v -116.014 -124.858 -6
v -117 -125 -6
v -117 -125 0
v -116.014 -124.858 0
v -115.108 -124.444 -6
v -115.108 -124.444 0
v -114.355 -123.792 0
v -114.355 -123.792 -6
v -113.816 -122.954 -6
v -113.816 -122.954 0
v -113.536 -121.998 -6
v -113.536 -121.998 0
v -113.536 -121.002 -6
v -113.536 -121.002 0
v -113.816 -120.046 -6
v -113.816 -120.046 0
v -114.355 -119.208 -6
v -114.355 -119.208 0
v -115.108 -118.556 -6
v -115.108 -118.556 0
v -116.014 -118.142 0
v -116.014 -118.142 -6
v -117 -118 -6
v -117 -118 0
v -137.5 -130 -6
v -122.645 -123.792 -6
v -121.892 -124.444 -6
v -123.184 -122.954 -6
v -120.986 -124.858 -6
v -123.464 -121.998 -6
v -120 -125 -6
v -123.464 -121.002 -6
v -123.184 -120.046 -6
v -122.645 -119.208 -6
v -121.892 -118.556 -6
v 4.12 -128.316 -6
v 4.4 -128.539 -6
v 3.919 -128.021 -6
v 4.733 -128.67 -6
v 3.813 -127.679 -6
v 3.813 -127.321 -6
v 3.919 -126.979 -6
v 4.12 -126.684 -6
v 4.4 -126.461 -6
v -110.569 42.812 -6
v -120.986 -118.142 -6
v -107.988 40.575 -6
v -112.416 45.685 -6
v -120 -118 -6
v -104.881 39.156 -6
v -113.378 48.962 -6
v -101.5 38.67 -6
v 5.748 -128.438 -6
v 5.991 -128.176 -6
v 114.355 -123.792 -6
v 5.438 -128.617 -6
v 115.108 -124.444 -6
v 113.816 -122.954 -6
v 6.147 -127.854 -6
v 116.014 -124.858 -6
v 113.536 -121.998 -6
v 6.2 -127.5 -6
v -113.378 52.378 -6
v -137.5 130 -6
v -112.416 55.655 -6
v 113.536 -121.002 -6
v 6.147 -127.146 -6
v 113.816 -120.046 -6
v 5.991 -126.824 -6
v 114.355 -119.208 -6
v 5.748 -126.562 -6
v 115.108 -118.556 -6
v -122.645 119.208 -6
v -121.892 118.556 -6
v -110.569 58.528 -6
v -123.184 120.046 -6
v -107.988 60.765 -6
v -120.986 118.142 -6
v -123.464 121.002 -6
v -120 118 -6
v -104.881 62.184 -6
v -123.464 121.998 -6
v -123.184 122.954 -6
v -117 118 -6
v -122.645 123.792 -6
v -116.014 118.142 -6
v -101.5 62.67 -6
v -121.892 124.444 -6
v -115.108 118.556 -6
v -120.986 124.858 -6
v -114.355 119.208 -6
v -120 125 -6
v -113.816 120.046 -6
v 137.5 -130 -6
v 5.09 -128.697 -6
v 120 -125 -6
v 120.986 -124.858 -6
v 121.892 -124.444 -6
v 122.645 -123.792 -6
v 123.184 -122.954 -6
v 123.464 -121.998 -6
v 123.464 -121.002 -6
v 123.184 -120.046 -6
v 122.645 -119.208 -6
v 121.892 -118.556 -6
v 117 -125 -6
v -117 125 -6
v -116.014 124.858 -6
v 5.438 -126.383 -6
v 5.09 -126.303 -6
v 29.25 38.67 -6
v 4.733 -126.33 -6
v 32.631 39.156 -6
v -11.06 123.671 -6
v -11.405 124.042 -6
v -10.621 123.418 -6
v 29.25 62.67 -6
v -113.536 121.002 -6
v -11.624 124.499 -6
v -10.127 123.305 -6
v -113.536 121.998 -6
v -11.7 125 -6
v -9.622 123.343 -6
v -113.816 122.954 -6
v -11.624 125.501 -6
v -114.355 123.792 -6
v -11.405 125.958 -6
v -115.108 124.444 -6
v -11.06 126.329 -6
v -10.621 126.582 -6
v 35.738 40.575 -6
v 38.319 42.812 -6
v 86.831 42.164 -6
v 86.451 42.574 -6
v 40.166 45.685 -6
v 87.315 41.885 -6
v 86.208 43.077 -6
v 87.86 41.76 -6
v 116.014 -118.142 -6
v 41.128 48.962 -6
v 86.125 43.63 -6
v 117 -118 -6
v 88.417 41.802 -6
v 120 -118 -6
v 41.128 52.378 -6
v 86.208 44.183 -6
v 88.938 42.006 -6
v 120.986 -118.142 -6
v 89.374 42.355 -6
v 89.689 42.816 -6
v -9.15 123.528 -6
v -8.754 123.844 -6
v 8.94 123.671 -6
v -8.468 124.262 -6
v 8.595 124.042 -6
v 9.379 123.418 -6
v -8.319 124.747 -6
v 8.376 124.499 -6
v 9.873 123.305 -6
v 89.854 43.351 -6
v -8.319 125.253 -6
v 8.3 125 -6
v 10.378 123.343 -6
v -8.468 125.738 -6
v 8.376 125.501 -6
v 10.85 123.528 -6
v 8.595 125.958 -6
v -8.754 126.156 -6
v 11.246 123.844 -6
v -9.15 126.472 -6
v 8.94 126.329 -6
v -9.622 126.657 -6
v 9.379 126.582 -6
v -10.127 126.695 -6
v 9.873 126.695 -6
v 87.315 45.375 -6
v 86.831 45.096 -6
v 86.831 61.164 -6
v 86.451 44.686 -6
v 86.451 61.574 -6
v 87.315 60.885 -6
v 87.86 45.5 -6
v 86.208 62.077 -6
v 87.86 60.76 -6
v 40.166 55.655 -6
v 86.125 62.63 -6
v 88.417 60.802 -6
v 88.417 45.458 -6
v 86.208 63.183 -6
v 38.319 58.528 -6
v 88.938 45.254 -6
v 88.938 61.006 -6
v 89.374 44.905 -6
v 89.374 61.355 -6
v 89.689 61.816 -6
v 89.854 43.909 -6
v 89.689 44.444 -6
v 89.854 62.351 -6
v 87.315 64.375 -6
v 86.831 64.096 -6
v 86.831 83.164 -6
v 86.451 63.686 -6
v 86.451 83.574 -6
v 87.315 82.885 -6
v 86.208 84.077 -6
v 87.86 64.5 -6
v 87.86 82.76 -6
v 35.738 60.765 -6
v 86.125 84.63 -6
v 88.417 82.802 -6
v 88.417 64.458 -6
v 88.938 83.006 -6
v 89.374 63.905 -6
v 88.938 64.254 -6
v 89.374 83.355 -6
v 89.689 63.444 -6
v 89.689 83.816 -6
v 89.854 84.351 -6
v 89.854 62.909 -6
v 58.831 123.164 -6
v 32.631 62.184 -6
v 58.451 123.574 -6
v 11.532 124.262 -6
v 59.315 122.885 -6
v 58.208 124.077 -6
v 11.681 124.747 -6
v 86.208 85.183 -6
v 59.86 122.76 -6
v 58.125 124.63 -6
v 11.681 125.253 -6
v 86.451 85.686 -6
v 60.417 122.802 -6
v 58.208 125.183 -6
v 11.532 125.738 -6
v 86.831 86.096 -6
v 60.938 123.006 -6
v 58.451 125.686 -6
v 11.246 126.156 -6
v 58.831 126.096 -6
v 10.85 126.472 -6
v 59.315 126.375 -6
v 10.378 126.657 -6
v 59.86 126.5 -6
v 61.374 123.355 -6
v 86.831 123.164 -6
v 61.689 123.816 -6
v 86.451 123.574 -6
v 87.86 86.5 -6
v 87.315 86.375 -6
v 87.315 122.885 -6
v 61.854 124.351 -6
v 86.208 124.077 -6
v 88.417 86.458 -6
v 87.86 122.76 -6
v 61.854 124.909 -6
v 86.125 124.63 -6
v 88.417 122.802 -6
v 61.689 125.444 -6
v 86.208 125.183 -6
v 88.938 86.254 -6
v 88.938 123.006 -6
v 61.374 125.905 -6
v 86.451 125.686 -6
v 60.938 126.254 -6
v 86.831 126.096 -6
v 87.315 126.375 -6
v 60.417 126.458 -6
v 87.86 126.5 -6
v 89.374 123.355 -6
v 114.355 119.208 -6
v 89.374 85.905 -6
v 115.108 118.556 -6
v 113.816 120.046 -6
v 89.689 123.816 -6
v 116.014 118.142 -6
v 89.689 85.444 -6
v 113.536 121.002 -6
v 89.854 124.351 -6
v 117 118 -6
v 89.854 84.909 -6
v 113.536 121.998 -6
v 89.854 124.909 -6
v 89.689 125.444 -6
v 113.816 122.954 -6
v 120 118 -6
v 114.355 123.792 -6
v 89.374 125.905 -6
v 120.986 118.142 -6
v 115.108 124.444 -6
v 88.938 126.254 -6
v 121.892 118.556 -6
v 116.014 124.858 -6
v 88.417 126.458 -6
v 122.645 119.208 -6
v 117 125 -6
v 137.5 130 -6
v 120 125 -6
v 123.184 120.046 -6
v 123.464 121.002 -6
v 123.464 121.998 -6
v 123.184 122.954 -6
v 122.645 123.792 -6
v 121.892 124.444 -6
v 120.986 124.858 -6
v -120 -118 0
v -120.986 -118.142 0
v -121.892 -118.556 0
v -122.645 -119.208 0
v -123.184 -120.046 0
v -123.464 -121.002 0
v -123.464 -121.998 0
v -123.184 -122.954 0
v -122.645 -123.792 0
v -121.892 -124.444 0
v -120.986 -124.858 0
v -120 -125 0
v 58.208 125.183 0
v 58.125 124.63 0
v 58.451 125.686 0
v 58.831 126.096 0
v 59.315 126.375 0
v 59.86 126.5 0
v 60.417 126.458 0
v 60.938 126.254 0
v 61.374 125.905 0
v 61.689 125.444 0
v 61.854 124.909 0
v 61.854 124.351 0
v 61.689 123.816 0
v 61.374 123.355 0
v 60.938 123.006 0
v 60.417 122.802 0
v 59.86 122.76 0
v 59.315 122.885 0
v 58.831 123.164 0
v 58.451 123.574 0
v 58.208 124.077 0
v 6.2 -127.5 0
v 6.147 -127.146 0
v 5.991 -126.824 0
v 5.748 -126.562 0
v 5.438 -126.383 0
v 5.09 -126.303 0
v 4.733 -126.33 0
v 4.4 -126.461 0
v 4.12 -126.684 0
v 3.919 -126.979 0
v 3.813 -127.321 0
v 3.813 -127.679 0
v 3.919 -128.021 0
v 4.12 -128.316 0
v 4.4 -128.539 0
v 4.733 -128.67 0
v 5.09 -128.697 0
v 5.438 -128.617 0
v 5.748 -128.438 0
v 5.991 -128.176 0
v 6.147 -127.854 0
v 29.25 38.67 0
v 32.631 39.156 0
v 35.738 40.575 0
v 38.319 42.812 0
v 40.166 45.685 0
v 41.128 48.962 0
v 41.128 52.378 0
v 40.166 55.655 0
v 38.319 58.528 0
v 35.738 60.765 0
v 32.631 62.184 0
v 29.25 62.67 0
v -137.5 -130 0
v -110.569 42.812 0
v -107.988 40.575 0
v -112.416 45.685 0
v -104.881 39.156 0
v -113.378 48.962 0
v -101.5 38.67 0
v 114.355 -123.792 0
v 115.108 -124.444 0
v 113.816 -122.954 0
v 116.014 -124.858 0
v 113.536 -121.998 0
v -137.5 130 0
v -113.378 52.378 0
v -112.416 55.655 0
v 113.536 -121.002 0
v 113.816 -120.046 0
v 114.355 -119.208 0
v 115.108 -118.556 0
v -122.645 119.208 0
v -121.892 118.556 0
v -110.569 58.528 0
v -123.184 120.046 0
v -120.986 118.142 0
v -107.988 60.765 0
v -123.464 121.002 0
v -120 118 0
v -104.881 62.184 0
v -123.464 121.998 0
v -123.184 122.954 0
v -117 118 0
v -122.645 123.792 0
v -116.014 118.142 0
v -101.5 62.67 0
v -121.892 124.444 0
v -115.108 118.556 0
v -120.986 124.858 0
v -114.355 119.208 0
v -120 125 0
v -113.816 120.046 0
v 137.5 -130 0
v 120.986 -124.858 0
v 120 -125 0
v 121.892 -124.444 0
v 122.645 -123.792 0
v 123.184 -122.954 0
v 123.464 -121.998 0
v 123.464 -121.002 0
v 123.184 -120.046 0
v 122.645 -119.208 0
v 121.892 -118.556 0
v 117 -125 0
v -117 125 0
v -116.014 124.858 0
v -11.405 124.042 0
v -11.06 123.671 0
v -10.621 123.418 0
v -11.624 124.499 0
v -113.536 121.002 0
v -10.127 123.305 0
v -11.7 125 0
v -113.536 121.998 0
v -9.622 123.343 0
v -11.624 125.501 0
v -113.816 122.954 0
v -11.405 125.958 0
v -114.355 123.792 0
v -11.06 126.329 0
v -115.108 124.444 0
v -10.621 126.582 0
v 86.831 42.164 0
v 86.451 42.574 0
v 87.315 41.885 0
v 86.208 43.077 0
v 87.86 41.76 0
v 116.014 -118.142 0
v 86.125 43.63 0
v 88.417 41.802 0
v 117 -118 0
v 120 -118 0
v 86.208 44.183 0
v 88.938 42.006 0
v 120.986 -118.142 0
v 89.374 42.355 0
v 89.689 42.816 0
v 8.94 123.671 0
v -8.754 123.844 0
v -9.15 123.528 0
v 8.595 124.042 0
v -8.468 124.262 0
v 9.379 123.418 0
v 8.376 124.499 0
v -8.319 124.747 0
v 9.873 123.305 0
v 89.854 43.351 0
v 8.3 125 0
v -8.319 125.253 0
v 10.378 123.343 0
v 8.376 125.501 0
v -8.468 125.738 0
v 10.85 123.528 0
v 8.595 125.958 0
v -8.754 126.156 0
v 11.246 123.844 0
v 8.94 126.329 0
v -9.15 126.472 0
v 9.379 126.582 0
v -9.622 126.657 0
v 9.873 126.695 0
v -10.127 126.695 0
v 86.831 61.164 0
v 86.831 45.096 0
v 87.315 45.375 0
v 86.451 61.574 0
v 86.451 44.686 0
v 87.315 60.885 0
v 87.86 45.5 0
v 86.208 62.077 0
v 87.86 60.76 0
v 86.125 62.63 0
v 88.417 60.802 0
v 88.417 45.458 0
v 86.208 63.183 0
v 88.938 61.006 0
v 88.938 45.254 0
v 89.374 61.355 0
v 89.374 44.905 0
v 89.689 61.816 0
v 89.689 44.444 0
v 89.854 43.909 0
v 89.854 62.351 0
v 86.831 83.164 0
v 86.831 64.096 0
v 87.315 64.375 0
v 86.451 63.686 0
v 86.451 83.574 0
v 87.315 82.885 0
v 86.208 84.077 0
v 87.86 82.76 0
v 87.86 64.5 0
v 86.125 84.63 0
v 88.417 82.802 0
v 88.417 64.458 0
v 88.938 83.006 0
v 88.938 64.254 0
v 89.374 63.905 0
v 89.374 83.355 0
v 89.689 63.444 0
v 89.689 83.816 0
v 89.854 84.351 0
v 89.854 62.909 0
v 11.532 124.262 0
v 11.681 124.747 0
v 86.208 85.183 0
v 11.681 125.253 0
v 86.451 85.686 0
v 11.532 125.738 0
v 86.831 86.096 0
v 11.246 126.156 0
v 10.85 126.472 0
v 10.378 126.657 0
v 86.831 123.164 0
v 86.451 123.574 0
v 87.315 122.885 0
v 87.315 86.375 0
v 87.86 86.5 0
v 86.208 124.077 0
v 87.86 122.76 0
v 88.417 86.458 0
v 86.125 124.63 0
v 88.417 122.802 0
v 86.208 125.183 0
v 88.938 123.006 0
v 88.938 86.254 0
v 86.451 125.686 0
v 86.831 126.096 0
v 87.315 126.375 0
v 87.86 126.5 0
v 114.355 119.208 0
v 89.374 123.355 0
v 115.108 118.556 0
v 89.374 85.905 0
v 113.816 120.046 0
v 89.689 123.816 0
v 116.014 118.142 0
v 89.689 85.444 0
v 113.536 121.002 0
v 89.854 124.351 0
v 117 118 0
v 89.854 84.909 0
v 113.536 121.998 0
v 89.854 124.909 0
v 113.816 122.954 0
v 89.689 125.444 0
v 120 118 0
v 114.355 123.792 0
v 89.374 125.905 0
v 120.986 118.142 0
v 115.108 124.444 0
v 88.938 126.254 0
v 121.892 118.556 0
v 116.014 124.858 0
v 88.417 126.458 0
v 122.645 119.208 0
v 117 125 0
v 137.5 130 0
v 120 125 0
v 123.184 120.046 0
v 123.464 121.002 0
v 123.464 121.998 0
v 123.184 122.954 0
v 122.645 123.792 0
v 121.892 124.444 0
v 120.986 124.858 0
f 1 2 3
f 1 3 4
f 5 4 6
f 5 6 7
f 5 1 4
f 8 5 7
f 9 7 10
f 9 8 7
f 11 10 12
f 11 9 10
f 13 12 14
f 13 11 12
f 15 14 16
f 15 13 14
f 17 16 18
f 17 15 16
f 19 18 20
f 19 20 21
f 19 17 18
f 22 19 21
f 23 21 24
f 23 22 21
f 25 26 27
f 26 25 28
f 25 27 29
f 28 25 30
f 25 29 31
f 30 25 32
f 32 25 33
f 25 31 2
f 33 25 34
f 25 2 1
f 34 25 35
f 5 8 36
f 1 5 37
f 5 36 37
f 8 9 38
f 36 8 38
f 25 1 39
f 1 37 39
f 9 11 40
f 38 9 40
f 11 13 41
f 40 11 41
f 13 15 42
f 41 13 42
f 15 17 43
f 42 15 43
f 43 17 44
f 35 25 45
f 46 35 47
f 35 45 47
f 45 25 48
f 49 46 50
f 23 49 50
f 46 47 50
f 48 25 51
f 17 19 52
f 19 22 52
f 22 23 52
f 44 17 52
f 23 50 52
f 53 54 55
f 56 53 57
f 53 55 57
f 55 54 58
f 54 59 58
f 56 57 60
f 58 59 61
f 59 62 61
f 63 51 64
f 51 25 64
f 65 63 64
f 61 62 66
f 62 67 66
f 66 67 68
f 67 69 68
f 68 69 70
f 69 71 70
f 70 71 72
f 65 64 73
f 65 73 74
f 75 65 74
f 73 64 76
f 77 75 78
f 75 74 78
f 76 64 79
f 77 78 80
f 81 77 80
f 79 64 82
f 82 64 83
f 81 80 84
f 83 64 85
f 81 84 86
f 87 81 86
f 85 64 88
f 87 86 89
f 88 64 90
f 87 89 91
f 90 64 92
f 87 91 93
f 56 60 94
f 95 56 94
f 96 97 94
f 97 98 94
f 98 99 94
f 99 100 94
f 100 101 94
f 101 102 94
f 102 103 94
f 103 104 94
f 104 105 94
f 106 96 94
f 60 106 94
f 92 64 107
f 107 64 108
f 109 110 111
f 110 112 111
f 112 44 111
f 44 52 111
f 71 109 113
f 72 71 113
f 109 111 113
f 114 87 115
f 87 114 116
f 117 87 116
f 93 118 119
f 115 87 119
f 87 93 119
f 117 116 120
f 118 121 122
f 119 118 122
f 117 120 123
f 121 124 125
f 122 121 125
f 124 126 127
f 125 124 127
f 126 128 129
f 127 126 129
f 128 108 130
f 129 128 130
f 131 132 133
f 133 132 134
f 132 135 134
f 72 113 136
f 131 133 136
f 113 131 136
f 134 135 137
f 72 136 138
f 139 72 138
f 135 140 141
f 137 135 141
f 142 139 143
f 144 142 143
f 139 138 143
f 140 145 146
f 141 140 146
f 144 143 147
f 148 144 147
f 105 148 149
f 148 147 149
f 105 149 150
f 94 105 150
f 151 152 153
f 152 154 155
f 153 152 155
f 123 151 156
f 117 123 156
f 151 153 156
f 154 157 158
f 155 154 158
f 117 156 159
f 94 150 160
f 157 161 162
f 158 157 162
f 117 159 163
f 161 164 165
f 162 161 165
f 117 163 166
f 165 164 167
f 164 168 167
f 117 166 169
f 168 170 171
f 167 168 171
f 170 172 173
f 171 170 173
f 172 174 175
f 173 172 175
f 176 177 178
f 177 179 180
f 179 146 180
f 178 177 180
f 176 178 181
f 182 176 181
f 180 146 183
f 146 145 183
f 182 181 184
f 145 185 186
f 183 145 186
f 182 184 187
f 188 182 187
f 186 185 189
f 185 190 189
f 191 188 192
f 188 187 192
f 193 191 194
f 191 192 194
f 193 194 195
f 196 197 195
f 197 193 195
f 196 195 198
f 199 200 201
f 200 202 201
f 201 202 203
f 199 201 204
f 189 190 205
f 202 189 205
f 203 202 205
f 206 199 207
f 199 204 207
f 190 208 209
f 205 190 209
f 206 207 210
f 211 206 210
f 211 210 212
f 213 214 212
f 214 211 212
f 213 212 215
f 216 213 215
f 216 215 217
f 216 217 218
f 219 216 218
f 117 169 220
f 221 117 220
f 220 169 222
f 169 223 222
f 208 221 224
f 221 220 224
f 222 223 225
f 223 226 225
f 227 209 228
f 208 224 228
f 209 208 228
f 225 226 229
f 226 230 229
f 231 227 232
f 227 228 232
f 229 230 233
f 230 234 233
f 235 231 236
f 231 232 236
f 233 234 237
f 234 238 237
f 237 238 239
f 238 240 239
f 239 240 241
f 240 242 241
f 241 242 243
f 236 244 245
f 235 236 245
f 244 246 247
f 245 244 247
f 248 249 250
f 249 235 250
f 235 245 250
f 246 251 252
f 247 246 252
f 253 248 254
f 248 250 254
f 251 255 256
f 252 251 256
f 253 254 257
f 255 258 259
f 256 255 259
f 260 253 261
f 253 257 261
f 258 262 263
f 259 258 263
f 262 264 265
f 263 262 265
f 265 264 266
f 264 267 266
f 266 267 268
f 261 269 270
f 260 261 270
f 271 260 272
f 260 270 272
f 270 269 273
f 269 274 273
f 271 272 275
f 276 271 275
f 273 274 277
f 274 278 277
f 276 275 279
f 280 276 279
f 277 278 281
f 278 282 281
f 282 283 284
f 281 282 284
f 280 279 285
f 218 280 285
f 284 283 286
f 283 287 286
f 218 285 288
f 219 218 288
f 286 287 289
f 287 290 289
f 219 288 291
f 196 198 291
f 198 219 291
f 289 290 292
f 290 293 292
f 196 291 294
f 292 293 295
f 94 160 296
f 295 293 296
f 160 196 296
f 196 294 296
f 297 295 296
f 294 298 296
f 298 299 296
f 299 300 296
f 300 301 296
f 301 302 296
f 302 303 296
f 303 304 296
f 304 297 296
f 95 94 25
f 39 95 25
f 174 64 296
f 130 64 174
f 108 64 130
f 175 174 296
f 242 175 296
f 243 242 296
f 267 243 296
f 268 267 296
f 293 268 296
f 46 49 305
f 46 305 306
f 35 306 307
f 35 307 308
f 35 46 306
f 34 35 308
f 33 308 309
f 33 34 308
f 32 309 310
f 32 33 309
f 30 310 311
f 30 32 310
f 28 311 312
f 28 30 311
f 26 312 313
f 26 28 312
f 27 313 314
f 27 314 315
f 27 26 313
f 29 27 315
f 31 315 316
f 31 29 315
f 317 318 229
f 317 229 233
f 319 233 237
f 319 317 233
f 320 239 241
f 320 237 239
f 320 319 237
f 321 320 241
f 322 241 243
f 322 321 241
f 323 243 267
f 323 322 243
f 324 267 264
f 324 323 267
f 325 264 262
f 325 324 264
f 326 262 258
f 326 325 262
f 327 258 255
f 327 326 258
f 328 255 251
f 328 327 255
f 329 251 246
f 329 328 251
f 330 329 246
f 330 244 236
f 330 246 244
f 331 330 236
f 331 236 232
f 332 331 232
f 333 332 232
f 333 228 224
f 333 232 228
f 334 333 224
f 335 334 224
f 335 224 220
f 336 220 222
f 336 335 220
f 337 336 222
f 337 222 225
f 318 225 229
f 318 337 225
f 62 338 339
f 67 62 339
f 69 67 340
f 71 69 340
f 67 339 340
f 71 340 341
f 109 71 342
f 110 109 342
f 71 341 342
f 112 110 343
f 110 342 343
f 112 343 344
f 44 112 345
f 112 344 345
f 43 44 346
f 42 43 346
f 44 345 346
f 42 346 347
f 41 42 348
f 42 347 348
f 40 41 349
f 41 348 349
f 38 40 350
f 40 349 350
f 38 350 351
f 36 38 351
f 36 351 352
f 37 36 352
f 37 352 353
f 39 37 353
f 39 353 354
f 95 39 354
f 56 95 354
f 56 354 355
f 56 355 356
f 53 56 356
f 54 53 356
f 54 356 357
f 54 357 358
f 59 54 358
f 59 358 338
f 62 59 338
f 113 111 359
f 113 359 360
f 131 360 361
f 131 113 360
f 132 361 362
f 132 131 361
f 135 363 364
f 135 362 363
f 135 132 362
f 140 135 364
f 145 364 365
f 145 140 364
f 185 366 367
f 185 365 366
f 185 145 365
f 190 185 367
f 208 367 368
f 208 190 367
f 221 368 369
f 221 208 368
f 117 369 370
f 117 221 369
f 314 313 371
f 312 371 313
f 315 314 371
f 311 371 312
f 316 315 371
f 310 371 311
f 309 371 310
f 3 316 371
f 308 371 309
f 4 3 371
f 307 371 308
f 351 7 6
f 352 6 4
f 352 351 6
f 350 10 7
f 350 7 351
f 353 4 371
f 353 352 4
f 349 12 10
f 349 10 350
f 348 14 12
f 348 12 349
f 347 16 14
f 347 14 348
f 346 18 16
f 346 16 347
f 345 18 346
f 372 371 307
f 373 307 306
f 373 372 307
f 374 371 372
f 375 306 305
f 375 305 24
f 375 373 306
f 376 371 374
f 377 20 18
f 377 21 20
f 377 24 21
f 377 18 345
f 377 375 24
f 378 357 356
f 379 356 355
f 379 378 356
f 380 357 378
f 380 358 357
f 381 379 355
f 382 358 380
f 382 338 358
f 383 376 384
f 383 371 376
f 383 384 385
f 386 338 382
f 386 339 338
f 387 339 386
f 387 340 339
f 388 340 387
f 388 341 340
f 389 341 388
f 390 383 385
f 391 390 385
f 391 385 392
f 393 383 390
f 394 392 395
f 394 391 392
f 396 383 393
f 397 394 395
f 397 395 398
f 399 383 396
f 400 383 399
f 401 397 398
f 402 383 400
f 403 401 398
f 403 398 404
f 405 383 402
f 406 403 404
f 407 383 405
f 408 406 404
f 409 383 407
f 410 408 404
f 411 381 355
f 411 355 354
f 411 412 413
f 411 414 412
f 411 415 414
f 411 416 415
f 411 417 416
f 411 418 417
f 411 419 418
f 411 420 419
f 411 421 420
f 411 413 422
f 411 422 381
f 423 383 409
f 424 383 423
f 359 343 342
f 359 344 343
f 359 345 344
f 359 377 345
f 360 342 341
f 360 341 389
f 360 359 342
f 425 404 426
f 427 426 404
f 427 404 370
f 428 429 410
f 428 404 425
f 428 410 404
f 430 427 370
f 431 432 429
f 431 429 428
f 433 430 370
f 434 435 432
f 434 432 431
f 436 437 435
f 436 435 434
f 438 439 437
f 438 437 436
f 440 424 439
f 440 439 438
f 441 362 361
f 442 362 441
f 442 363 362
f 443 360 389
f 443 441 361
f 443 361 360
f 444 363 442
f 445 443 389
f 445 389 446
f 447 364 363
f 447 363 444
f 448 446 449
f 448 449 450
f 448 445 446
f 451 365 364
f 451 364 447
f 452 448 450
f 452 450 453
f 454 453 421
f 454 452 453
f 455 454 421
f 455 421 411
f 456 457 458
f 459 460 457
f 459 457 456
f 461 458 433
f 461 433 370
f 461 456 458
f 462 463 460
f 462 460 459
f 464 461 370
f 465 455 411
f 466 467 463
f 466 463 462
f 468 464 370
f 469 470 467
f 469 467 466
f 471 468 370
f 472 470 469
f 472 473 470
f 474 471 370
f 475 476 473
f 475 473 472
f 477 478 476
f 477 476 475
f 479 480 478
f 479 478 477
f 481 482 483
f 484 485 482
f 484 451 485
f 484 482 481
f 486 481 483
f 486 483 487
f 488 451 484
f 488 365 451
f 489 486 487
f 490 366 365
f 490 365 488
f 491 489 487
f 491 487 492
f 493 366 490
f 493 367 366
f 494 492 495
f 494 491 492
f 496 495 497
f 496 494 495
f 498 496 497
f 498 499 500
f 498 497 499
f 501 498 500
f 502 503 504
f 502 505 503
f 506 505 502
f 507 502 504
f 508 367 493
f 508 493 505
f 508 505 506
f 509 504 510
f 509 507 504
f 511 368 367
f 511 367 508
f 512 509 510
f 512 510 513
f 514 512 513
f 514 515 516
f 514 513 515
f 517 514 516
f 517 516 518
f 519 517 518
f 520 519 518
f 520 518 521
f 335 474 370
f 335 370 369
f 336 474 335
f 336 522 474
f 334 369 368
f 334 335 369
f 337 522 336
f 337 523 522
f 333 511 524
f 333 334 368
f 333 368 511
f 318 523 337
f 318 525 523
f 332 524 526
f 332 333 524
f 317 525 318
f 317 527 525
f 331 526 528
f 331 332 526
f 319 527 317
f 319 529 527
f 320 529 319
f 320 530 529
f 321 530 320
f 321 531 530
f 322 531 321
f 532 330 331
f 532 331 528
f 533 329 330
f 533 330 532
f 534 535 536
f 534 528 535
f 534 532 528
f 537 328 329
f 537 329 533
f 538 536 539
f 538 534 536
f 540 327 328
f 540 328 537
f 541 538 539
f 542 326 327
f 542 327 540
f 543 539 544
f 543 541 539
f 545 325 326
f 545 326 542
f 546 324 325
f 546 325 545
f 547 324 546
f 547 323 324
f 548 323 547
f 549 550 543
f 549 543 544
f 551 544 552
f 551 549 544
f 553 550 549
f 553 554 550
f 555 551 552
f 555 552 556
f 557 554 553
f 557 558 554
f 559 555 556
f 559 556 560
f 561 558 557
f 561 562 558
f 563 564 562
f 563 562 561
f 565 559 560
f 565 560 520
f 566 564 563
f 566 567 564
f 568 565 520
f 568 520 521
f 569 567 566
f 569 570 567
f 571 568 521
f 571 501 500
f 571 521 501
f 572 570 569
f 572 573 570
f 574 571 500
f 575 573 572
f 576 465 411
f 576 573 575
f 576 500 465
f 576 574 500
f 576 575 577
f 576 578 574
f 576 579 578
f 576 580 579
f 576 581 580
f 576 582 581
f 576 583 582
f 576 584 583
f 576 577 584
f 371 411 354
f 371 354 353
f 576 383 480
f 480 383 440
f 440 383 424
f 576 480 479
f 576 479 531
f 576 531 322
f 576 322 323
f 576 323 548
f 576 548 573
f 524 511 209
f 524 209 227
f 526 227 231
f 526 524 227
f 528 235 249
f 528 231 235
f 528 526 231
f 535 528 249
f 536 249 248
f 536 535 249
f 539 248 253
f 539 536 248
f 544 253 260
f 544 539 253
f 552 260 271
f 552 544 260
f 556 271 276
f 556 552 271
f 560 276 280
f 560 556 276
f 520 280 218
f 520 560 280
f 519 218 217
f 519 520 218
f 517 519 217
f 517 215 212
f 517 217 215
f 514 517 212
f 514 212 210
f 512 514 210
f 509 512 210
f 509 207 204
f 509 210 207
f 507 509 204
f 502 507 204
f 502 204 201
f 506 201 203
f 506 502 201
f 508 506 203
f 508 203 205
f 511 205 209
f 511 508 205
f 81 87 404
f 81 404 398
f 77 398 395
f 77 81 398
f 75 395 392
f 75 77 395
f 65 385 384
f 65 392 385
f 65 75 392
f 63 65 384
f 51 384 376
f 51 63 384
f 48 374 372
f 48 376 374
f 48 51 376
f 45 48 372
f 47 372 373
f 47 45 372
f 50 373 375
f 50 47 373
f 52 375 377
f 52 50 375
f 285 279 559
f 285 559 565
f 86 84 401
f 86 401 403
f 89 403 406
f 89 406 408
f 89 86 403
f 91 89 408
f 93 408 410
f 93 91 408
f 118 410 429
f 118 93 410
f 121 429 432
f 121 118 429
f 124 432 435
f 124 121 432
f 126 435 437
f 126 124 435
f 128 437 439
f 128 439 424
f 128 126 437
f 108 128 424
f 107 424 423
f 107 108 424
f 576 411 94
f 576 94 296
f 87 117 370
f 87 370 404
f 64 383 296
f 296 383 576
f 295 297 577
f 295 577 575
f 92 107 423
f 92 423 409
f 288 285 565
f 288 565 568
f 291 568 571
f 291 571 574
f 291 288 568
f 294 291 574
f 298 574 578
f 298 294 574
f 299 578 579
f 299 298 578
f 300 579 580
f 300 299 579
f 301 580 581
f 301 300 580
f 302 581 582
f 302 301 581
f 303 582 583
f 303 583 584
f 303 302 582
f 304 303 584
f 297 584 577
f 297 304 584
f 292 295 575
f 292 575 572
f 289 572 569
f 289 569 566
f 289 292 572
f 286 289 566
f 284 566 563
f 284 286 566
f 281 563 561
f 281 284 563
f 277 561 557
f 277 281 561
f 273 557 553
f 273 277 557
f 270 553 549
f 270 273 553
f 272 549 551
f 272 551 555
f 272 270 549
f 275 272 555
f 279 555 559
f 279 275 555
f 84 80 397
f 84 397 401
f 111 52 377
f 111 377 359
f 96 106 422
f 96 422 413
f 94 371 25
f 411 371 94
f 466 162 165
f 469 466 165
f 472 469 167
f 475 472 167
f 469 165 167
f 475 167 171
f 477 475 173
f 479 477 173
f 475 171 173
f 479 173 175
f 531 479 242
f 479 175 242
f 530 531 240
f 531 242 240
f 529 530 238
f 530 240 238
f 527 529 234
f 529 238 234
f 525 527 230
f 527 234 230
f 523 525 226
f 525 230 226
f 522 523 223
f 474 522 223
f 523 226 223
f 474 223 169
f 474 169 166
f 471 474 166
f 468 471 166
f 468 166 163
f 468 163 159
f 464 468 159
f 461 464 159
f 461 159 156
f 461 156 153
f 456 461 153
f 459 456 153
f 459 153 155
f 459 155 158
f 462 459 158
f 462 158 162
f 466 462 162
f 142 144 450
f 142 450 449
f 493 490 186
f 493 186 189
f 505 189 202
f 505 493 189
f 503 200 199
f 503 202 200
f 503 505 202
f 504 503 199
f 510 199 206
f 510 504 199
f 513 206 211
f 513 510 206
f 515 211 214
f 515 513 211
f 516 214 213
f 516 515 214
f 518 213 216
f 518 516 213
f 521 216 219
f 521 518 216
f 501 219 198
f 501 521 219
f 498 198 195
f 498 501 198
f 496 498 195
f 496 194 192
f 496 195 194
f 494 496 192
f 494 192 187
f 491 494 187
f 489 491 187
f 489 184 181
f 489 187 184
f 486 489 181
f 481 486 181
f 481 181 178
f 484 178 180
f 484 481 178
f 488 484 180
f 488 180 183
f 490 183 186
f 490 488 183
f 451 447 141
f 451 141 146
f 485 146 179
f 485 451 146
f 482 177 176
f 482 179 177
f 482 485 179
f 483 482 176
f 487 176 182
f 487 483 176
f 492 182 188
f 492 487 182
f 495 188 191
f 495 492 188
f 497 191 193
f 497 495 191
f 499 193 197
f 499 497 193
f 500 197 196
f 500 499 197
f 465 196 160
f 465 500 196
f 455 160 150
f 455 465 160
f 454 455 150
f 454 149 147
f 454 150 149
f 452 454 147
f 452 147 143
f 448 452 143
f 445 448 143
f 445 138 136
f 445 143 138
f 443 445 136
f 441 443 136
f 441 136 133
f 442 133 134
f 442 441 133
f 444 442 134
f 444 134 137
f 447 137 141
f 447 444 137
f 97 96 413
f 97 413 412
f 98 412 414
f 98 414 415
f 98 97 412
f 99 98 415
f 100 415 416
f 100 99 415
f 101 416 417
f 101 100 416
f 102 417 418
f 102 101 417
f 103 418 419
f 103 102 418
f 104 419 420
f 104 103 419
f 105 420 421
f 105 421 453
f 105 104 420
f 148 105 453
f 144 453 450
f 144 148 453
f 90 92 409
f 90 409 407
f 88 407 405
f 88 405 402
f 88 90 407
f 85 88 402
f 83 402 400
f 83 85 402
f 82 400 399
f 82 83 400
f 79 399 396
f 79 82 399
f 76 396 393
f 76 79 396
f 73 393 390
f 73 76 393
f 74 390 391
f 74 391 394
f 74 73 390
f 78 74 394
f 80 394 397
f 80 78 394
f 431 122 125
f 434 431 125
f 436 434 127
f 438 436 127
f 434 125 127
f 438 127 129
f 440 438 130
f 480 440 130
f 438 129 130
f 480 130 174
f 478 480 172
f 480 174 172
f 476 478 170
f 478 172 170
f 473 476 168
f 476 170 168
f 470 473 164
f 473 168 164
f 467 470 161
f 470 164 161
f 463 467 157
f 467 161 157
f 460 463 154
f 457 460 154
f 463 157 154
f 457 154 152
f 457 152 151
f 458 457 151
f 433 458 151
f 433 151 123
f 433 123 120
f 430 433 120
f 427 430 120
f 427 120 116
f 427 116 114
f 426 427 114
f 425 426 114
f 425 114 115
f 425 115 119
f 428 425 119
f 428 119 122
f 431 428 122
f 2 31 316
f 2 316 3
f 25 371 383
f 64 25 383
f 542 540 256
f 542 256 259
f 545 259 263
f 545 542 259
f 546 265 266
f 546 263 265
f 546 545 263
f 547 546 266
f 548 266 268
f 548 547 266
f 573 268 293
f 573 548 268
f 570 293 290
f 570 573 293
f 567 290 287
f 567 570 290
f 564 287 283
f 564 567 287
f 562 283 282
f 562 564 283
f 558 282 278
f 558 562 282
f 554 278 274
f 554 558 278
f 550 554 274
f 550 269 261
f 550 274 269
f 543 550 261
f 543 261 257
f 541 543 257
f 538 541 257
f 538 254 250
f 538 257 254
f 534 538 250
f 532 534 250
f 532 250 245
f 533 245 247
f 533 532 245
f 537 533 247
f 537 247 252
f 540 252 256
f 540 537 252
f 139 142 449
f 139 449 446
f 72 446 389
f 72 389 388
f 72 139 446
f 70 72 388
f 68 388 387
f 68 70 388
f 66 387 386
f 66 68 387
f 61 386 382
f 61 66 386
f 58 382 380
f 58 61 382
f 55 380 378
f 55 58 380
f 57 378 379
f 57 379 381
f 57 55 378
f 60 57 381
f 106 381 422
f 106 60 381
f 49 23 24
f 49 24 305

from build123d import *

# Parameters (mm, degrees)
CROQUIS1_W                      = 275
CROQUIS1_H                      = 260
BRIDA_BASE1_DEPTH               = 6
CORTAR_EXTRUIR1_DEPTH           = 190.320495457
CORTAR_EXTRUIR1_DEPTH_BACK      = 190.320495457
CROQUIS3_R                      = 1.875
CORTAR_EXTRUIR2_DEPTH           = 190.320495457
CORTAR_EXTRUIR2_DEPTH_BACK      = 190.320495457
RANURA_START                    = -6
RANURA_DE_MARGEN_PARA_M61_DEPTH = 6
CROQUIS9_R                      = 1.2
CORTAR_EXTRUIR4_DEPTH           = 190.320495457
TALADRO_DE_MARGEN_PARA_M31_D    = 3.4


# Read off the part's stored shape, not the designer's step: Ranura de margen para M61
# Sheet-metal steps are written as plain solids
with BuildPart() as part:
    # Croquis1 → Brida base1 (new body)
    with BuildSketch(Plane.XY):
        Rectangle(CROQUIS1_W, CROQUIS1_H)
    extrude(amount=-BRIDA_BASE1_DEPTH)

    # Croquis3 → Cortar-Extruir1 (cut, two sides: drawn at the far end of the back side and taken through both)
    with BuildSketch(Plane(origin=(0, 0, -6), x_dir=(-1, 0, 0), z_dir=(0, 0, -1)).offset(-CORTAR_EXTRUIR1_DEPTH_BACK)):
        with Locations((-88, 84.63)):
            Circle(CROQUIS3_R)
        with Locations((-60, 124.63)):
            Circle(CROQUIS3_R)
        with Locations((-88, 124.63)):
            Circle(CROQUIS3_R)
        with Locations((-88, 62.63)):
            Circle(CROQUIS3_R)
        with Locations((-88, 43.63)):
            Circle(CROQUIS3_R)
    extrude(amount=CORTAR_EXTRUIR1_DEPTH + CORTAR_EXTRUIR1_DEPTH_BACK, mode=Mode.SUBTRACT)

    # Croquis4 → Cortar-Extruir2 (cut, two sides: drawn at the far end of the back side and taken through both)
    with BuildSketch(Plane.XY.offset(-CORTAR_EXTRUIR2_DEPTH_BACK)):
        with BuildLine():
            Line((-101.5, 38.67), (29.25, 38.67))
            ThreePointArc((29.25, 38.67), (41.25, 50.67), (29.25, 62.67))
            Line((29.25, 62.67), (-101.5, 62.67))
            ThreePointArc((-101.5, 62.67), (-113.5, 50.67), (-101.5, 38.67))
        make_face()
    extrude(amount=CORTAR_EXTRUIR2_DEPTH + CORTAR_EXTRUIR2_DEPTH_BACK, mode=Mode.SUBTRACT)

    # Ranura de margen para M61 outline → Ranura de margen para M61 (cut)
    with BuildSketch(Plane.XY.offset(RANURA_START)):
        with BuildLine():
            Line((117, 118), (120, 118))
            ThreePointArc((120, 118), (123.5, 121.5), (120, 125))
            Line((120, 125), (117, 125))
            ThreePointArc((117, 125), (113.5, 121.5), (117, 118))
        make_face()
        with BuildLine():
            ThreePointArc((-117, 118), (-113.5, 121.5), (-117, 125))
            Line((-117, 125), (-120, 125))
            ThreePointArc((-120, 125), (-123.5, 121.5), (-120, 118))
            Line((-120, 118), (-117, 118))
        make_face()
        with BuildLine():
            Line((-120, -125), (-117, -125))
            ThreePointArc((-117, -125), (-113.5, -121.5), (-117, -118))
            Line((-117, -118), (-120, -118))
            ThreePointArc((-120, -118), (-123.5, -121.5), (-120, -125))
        make_face()
        with BuildLine():
            ThreePointArc((120, -125), (123.5, -121.5), (120, -118))
            Line((120, -118), (117, -118))
            ThreePointArc((117, -118), (113.5, -121.5), (117, -125))
            Line((117, -125), (120, -125))
        make_face()
    extrude(amount=RANURA_DE_MARGEN_PARA_M61_DEPTH, mode=Mode.SUBTRACT)

    # Croquis9 → Cortar-Extruir4 (cut, through all)
    with BuildSketch(Plane.XY):
        with Locations((5, -127.5)):
            Circle(CROQUIS9_R)
    extrude(amount=-CORTAR_EXTRUIR4_DEPTH, mode=Mode.SUBTRACT)

    # Taladro de margen para M31 (through all)
    with Locations(Plane.XY):
        with Locations((10, 125), (-10, 125)):
            Hole(TALADRO_DE_MARGEN_PARA_M31_D / 2)


solid = part.part
